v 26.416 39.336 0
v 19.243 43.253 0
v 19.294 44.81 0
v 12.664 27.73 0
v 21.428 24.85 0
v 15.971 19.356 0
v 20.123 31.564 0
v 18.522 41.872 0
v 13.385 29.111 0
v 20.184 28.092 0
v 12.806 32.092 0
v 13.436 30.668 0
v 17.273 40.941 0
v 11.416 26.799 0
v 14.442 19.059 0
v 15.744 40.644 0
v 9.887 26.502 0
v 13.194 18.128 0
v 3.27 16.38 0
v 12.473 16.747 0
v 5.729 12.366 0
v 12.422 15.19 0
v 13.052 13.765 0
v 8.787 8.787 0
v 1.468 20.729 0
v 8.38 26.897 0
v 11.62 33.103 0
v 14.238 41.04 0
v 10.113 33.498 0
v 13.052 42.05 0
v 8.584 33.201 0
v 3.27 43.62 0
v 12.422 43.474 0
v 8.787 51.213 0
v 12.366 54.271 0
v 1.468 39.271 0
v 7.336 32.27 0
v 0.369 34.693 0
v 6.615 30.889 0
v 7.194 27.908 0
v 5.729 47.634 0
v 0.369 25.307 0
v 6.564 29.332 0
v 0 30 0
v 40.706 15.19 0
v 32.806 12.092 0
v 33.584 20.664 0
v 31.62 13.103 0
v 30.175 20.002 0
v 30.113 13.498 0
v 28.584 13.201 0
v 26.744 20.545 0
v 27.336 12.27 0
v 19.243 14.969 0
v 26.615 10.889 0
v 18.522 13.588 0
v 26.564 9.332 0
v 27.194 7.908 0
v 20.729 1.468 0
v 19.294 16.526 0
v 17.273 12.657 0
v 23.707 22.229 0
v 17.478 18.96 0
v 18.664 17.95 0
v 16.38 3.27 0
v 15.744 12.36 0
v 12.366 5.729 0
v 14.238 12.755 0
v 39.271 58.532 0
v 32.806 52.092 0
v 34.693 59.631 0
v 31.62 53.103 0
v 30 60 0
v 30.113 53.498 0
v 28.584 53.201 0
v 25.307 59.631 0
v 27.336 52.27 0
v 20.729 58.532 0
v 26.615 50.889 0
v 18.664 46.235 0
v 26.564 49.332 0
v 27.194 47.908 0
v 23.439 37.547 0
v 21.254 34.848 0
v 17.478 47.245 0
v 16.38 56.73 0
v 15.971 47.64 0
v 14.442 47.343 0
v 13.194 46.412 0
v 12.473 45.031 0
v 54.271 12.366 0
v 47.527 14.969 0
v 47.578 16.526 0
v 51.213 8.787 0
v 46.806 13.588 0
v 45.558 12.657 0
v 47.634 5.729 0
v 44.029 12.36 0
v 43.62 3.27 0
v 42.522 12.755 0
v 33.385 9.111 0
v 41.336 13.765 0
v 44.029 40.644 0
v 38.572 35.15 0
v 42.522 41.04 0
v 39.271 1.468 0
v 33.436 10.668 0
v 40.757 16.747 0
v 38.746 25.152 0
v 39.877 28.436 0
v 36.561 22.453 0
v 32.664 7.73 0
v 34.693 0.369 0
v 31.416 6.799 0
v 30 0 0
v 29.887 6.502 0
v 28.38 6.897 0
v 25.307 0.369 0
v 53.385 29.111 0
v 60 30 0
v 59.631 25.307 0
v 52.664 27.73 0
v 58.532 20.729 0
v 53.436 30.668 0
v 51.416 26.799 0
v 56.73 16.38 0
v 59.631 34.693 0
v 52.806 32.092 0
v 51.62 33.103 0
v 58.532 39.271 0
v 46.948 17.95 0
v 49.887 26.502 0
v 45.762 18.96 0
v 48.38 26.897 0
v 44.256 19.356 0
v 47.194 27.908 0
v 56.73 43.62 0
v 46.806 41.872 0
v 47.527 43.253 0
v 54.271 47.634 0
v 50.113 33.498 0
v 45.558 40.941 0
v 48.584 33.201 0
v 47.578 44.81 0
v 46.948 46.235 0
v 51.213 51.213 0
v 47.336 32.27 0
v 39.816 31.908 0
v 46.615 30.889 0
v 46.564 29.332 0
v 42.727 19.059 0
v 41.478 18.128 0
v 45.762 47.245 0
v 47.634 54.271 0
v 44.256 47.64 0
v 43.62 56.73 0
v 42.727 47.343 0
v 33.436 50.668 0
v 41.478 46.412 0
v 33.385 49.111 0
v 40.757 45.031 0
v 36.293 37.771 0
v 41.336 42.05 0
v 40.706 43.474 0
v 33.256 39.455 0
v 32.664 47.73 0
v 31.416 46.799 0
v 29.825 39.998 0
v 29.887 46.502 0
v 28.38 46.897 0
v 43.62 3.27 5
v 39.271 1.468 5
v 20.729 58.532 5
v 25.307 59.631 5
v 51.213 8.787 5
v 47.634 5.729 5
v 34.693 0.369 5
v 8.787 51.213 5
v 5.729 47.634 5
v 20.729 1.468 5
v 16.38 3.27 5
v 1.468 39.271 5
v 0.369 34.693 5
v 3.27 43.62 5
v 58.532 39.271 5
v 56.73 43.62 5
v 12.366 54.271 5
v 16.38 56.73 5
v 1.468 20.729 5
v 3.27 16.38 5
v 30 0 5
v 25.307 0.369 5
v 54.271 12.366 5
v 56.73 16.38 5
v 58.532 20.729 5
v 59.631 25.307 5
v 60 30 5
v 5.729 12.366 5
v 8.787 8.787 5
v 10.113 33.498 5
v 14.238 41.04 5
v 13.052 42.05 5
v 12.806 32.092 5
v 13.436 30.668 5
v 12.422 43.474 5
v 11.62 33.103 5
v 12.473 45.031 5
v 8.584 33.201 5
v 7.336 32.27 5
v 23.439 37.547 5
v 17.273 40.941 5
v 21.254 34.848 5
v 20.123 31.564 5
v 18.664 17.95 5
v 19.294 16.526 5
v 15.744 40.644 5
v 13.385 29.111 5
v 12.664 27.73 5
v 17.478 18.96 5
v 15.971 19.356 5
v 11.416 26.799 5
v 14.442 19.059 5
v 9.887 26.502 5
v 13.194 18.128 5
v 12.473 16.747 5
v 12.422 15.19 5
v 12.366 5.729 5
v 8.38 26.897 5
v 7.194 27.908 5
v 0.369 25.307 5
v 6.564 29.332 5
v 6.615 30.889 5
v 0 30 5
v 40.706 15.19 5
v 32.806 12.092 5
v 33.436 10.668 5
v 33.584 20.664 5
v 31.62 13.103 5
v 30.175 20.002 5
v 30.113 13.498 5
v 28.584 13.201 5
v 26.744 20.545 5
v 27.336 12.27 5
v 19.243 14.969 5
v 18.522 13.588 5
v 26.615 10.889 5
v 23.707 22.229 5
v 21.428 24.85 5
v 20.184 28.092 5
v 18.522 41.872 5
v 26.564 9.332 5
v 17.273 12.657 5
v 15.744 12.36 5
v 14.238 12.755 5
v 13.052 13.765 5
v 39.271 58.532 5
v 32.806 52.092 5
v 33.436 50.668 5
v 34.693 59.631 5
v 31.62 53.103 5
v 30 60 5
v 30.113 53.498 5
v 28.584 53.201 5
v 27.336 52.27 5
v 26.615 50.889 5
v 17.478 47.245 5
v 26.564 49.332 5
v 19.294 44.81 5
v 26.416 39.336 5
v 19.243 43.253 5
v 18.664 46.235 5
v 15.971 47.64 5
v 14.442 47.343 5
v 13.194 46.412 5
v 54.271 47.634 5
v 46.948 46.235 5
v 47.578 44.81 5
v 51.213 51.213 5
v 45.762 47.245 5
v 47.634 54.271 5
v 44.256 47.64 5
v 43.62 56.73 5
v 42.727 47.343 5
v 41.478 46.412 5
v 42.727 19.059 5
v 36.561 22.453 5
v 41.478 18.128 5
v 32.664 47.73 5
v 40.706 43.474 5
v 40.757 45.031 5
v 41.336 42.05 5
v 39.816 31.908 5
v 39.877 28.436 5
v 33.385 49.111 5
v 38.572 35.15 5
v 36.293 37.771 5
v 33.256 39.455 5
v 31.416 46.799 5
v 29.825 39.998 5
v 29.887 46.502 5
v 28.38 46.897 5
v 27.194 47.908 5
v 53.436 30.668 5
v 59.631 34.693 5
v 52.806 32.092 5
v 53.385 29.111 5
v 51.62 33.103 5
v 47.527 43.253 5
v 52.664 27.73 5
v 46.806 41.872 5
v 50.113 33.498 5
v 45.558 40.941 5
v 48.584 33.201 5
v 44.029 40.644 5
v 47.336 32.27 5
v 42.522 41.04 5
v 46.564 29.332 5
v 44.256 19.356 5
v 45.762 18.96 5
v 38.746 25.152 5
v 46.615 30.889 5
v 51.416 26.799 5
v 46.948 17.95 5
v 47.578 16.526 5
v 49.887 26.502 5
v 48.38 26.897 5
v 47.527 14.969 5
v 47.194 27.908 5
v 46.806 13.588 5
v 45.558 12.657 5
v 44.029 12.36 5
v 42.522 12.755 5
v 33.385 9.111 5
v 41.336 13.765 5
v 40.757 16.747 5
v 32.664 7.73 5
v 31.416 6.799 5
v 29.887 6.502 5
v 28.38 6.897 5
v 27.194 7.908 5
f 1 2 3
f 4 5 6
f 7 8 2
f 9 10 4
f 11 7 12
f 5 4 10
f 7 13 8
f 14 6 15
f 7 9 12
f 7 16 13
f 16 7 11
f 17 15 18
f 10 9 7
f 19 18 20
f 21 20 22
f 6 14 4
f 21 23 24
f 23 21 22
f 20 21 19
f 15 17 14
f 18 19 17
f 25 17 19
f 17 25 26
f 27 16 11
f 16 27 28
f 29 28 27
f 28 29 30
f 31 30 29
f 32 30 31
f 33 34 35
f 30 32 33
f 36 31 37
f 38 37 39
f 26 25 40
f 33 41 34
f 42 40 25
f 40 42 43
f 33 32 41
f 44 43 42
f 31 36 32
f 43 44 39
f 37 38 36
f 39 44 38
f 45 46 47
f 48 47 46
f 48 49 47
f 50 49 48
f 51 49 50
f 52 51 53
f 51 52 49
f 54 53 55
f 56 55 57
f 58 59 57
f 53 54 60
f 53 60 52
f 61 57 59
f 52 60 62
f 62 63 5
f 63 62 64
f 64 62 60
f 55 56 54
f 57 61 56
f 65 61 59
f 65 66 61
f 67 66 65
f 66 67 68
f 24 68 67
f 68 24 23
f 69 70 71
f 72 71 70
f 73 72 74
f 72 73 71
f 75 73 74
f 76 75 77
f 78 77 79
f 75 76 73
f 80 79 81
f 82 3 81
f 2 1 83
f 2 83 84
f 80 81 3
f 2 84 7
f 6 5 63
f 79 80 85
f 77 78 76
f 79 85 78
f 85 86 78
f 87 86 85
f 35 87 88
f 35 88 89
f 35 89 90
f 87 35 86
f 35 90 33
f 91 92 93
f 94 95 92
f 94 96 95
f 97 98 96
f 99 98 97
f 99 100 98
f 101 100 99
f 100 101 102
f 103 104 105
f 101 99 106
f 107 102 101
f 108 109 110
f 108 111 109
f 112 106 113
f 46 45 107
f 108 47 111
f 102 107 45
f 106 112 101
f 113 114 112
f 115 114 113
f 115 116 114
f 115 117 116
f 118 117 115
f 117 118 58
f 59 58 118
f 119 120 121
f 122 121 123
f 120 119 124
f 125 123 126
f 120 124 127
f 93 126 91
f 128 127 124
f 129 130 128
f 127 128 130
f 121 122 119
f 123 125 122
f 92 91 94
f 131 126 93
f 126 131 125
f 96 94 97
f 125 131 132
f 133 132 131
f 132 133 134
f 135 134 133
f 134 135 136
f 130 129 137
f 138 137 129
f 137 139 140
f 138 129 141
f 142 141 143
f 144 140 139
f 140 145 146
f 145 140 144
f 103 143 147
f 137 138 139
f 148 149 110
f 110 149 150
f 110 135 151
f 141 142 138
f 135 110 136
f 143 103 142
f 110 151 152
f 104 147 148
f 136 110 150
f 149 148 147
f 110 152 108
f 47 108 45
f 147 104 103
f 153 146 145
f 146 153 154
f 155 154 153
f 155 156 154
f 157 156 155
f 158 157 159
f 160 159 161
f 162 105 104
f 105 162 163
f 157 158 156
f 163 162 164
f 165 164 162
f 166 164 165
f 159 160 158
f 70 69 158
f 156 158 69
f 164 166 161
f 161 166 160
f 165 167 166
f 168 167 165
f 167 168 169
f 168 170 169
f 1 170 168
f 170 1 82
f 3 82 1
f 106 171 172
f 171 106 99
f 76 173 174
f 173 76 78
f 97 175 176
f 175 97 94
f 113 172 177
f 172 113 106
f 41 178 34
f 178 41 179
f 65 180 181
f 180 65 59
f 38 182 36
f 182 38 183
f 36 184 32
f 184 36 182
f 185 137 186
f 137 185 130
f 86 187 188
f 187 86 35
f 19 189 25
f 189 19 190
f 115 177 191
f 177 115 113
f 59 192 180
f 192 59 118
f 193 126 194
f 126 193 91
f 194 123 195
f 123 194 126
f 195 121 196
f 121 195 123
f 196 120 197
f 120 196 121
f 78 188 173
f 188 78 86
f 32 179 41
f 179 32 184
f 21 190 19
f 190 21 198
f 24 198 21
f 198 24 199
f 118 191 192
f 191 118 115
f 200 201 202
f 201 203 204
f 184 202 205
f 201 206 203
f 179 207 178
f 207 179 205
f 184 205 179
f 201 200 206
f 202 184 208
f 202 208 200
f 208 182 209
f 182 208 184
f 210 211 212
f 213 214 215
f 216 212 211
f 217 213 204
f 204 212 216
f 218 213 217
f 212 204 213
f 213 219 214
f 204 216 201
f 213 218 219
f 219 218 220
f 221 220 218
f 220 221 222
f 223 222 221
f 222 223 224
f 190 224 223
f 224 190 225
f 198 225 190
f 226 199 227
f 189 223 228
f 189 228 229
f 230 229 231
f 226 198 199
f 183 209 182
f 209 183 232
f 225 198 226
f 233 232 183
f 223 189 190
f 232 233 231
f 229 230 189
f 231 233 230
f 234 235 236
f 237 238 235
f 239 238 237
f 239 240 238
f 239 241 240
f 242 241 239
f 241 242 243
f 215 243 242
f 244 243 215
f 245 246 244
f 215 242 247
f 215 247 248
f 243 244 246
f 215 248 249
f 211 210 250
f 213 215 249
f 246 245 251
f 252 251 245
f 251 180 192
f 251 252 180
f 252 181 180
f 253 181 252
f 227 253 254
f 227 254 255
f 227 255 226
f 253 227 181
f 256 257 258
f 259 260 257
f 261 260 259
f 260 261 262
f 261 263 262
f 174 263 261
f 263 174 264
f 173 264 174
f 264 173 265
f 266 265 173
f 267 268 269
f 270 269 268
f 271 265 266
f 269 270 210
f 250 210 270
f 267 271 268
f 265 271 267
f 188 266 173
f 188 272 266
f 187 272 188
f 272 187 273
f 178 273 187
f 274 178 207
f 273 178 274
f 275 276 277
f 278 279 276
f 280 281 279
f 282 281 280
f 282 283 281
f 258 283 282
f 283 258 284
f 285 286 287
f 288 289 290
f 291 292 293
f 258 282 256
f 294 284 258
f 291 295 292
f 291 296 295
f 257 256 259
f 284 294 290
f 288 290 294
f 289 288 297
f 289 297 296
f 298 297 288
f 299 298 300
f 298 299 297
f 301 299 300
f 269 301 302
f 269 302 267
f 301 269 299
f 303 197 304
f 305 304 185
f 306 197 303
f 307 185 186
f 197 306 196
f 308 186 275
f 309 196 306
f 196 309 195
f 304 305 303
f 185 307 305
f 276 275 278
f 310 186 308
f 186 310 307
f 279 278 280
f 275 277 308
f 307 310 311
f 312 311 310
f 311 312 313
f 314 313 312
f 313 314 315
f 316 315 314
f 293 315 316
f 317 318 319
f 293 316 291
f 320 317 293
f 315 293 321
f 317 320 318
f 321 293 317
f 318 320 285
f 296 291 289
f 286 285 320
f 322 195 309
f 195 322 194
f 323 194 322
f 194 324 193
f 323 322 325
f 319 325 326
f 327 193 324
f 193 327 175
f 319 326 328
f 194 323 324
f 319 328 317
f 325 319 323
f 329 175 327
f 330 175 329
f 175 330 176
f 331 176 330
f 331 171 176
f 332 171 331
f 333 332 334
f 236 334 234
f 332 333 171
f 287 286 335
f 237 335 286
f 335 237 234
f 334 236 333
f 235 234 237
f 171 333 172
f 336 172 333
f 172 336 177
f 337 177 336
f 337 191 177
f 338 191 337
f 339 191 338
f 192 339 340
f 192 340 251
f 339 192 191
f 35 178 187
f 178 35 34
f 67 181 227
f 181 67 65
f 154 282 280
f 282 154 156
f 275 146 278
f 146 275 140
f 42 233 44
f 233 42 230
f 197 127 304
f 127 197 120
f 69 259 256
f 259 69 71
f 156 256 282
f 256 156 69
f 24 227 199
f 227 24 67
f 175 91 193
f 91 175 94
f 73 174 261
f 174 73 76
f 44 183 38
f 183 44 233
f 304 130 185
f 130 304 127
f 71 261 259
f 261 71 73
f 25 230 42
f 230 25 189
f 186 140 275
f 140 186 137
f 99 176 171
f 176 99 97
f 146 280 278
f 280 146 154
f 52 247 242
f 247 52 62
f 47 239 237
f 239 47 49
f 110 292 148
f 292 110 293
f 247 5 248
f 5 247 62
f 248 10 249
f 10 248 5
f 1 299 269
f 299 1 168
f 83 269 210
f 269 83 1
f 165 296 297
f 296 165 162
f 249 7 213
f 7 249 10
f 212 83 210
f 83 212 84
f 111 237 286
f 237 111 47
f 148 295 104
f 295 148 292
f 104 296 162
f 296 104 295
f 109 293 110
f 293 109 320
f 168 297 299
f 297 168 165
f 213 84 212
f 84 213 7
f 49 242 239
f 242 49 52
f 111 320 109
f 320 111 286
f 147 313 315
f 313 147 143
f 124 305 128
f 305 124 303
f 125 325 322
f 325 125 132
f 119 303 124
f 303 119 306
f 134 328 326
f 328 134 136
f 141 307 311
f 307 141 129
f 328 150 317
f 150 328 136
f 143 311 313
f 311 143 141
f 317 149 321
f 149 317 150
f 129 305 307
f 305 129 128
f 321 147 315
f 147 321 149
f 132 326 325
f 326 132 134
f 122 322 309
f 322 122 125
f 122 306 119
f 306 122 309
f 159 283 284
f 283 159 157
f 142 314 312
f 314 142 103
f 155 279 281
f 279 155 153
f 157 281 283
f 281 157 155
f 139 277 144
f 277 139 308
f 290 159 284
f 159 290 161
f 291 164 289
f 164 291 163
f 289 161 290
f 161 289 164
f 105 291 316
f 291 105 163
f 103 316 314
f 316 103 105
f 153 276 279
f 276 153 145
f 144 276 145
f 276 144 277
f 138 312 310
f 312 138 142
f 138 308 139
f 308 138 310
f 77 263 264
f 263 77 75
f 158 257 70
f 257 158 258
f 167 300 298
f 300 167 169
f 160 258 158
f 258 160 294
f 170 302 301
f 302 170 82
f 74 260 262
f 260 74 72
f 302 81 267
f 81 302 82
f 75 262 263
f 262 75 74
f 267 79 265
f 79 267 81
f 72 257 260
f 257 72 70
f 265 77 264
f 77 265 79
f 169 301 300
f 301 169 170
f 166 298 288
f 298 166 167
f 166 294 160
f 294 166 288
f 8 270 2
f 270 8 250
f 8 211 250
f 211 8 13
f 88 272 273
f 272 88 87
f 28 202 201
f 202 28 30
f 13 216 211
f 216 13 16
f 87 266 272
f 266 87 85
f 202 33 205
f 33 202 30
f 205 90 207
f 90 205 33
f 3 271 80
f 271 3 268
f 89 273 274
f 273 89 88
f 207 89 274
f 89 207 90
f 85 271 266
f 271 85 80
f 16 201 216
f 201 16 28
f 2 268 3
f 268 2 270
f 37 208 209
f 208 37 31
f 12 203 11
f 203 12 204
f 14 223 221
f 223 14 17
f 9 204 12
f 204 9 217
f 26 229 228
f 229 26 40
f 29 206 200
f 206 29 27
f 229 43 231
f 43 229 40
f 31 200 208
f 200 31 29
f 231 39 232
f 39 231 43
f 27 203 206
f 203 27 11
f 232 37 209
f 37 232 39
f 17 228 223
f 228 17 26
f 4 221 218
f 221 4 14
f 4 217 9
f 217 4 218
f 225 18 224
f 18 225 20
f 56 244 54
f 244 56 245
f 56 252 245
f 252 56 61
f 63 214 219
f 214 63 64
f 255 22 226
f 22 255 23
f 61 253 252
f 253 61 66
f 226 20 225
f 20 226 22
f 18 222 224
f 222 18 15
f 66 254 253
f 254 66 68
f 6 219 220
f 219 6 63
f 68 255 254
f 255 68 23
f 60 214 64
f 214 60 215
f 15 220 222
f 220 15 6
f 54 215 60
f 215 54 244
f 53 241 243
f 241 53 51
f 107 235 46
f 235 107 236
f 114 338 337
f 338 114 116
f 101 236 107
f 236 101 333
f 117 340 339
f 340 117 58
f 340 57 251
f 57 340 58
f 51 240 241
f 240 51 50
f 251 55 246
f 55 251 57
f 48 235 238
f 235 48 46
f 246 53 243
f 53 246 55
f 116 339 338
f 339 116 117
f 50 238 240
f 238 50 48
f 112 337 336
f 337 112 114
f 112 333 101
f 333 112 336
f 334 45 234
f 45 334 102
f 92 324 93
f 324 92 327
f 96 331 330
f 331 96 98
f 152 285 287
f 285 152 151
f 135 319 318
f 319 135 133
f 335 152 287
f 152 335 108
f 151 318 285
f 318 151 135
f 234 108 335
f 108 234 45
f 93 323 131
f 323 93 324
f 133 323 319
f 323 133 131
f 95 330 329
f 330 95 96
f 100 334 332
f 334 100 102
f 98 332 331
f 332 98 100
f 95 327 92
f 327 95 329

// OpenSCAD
$fn = 32;

// ----------------------------------------------------------------------
// Spacer plate: round flange R30, 8 bolts
// ----------------------------------------------------------------------

// --- parameters (mm) ---
bore_r = 10;              // centre bore radius
bolt_r = 3.5;             // bolt hole radius
plate_t = 5;              // plate thickness, Z (extrusion height)
flange_r = 30;            // flange radius
n_bolt = 8;               // bolt hole count
ring_r = 20;              // bolt circle radius

profile = [[60, 30], [59.631, 34.693], [58.532, 39.271], [56.73, 43.62], [54.271, 47.634], [51.213, 51.213], [47.634, 54.271], [43.62, 56.73], [39.271, 58.532], [34.693, 59.631], [30, 60], [25.307, 59.631], [20.729, 58.532], [16.38, 56.73], [12.366, 54.271], [8.787, 51.213], [5.729, 47.634], [3.27, 43.62], [1.468, 39.271], [0.369, 34.693], [0, 30], [0.369, 25.307], [1.468, 20.729], [3.27, 16.38], [5.729, 12.366], [8.787, 8.787], [12.366, 5.729], [16.38, 3.27], [20.729, 1.468], [25.307, 0.369], [30, 0], [34.693, 0.369], [39.271, 1.468], [43.62, 3.27], [47.634, 5.729], [51.213, 8.787], [54.271, 12.366], [56.73, 16.38], [58.532, 20.729], [59.631, 25.307]];  // primary outline, 40 points, counter clockwise
void_1 = [[39.816, 31.908], [38.572, 35.15], [36.293, 37.771], [33.256, 39.455], [29.825, 39.998], [26.416, 39.336], [23.439, 37.547], [21.254, 34.848], [20.123, 31.564], [20.184, 28.092], [21.428, 24.85], [23.707, 22.229], [26.744, 20.545], [30.175, 20.002], [33.584, 20.664], [36.561, 22.453], [38.746, 25.152], [39.877, 28.436]];  // centre bore, 18 points
void_2 = [[53.436, 30.668], [52.806, 32.092], [51.62, 33.103], [50.113, 33.498], [48.584, 33.201], [47.336, 32.27], [46.615, 30.889], [46.564, 29.332], [47.194, 27.908], [48.38, 26.897], [49.887, 26.502], [51.416, 26.799], [52.664, 27.73], [53.385, 29.111]];  // bolt hole 1, 14 points
void_3 = [[47.578, 44.81], [46.948, 46.235], [45.762, 47.245], [44.256, 47.64], [42.727, 47.343], [41.478, 46.412], [40.757, 45.031], [40.706, 43.474], [41.336, 42.05], [42.522, 41.04], [44.029, 40.644], [45.558, 40.941], [46.806, 41.872], [47.527, 43.253]];  // bolt hole 2, 14 points
void_4 = [[33.436, 50.668], [32.806, 52.092], [31.62, 53.103], [30.113, 53.498], [28.584, 53.201], [27.336, 52.27], [26.615, 50.889], [26.564, 49.332], [27.194, 47.908], [28.38, 46.897], [29.887, 46.502], [31.416, 46.799], [32.664, 47.73], [33.385, 49.111]];  // bolt hole 3, 14 points
void_5 = [[19.294, 44.81], [18.664, 46.235], [17.478, 47.245], [15.971, 47.64], [14.442, 47.343], [13.194, 46.412], [12.473, 45.031], [12.422, 43.474], [13.052, 42.05], [14.238, 41.04], [15.744, 40.644], [17.273, 40.941], [18.522, 41.872], [19.243, 43.253]];  // bolt hole 4, 14 points
void_6 = [[13.436, 30.668], [12.806, 32.092], [11.62, 33.103], [10.113, 33.498], [8.584, 33.201], [7.336, 32.27], [6.615, 30.889], [6.564, 29.332], [7.194, 27.908], [8.38, 26.897], [9.887, 26.502], [11.416, 26.799], [12.664, 27.73], [13.385, 29.111]];  // bolt hole 5, 14 points
void_7 = [[19.294, 16.526], [18.664, 17.95], [17.478, 18.96], [15.971, 19.356], [14.442, 19.059], [13.194, 18.128], [12.473, 16.747], [12.422, 15.19], [13.052, 13.765], [14.238, 12.755], [15.744, 12.36], [17.273, 12.657], [18.522, 13.588], [19.243, 14.969]];  // bolt hole 6, 14 points
void_8 = [[33.436, 10.668], [32.806, 12.092], [31.62, 13.103], [30.113, 13.498], [28.584, 13.201], [27.336, 12.27], [26.615, 10.889], [26.564, 9.332], [27.194, 7.908], [28.38, 6.897], [29.887, 6.502], [31.416, 6.799], [32.664, 7.73], [33.385, 9.111]];  // bolt hole 7, 14 points
void_9 = [[47.578, 16.526], [46.948, 17.95], [45.762, 18.96], [44.256, 19.356], [42.727, 19.059], [41.478, 18.128], [40.757, 16.747], [40.706, 15.19], [41.336, 13.765], [42.522, 12.755], [44.029, 12.36], [45.558, 12.657], [46.806, 13.588], [47.527, 14.969]];  // bolt hole 8, 14 points

// --- the one profile operation ---
difference() {
  linear_extrude(height = plate_t) polygon(points = profile);
  translate([0, 0, -1])
    linear_extrude(height = plate_t + 2) polygon(points = void_1);
  translate([0, 0, -1])
    linear_extrude(height = plate_t + 2) polygon(points = void_2);
  translate([0, 0, -1])
    linear_extrude(height = plate_t + 2) polygon(points = void_3);
  translate([0, 0, -1])
    linear_extrude(height = plate_t + 2) polygon(points = void_4);
  translate([0, 0, -1])
    linear_extrude(height = plate_t + 2) polygon(points = void_5);
  translate([0, 0, -1])
    linear_extrude(height = plate_t + 2) polygon(points = void_6);
  translate([0, 0, -1])
    linear_extrude(height = plate_t + 2) polygon(points = void_7);
  translate([0, 0, -1])
    linear_extrude(height = plate_t + 2) polygon(points = void_8);
  translate([0, 0, -1])
    linear_extrude(height = plate_t + 2) polygon(points = void_9);
}
